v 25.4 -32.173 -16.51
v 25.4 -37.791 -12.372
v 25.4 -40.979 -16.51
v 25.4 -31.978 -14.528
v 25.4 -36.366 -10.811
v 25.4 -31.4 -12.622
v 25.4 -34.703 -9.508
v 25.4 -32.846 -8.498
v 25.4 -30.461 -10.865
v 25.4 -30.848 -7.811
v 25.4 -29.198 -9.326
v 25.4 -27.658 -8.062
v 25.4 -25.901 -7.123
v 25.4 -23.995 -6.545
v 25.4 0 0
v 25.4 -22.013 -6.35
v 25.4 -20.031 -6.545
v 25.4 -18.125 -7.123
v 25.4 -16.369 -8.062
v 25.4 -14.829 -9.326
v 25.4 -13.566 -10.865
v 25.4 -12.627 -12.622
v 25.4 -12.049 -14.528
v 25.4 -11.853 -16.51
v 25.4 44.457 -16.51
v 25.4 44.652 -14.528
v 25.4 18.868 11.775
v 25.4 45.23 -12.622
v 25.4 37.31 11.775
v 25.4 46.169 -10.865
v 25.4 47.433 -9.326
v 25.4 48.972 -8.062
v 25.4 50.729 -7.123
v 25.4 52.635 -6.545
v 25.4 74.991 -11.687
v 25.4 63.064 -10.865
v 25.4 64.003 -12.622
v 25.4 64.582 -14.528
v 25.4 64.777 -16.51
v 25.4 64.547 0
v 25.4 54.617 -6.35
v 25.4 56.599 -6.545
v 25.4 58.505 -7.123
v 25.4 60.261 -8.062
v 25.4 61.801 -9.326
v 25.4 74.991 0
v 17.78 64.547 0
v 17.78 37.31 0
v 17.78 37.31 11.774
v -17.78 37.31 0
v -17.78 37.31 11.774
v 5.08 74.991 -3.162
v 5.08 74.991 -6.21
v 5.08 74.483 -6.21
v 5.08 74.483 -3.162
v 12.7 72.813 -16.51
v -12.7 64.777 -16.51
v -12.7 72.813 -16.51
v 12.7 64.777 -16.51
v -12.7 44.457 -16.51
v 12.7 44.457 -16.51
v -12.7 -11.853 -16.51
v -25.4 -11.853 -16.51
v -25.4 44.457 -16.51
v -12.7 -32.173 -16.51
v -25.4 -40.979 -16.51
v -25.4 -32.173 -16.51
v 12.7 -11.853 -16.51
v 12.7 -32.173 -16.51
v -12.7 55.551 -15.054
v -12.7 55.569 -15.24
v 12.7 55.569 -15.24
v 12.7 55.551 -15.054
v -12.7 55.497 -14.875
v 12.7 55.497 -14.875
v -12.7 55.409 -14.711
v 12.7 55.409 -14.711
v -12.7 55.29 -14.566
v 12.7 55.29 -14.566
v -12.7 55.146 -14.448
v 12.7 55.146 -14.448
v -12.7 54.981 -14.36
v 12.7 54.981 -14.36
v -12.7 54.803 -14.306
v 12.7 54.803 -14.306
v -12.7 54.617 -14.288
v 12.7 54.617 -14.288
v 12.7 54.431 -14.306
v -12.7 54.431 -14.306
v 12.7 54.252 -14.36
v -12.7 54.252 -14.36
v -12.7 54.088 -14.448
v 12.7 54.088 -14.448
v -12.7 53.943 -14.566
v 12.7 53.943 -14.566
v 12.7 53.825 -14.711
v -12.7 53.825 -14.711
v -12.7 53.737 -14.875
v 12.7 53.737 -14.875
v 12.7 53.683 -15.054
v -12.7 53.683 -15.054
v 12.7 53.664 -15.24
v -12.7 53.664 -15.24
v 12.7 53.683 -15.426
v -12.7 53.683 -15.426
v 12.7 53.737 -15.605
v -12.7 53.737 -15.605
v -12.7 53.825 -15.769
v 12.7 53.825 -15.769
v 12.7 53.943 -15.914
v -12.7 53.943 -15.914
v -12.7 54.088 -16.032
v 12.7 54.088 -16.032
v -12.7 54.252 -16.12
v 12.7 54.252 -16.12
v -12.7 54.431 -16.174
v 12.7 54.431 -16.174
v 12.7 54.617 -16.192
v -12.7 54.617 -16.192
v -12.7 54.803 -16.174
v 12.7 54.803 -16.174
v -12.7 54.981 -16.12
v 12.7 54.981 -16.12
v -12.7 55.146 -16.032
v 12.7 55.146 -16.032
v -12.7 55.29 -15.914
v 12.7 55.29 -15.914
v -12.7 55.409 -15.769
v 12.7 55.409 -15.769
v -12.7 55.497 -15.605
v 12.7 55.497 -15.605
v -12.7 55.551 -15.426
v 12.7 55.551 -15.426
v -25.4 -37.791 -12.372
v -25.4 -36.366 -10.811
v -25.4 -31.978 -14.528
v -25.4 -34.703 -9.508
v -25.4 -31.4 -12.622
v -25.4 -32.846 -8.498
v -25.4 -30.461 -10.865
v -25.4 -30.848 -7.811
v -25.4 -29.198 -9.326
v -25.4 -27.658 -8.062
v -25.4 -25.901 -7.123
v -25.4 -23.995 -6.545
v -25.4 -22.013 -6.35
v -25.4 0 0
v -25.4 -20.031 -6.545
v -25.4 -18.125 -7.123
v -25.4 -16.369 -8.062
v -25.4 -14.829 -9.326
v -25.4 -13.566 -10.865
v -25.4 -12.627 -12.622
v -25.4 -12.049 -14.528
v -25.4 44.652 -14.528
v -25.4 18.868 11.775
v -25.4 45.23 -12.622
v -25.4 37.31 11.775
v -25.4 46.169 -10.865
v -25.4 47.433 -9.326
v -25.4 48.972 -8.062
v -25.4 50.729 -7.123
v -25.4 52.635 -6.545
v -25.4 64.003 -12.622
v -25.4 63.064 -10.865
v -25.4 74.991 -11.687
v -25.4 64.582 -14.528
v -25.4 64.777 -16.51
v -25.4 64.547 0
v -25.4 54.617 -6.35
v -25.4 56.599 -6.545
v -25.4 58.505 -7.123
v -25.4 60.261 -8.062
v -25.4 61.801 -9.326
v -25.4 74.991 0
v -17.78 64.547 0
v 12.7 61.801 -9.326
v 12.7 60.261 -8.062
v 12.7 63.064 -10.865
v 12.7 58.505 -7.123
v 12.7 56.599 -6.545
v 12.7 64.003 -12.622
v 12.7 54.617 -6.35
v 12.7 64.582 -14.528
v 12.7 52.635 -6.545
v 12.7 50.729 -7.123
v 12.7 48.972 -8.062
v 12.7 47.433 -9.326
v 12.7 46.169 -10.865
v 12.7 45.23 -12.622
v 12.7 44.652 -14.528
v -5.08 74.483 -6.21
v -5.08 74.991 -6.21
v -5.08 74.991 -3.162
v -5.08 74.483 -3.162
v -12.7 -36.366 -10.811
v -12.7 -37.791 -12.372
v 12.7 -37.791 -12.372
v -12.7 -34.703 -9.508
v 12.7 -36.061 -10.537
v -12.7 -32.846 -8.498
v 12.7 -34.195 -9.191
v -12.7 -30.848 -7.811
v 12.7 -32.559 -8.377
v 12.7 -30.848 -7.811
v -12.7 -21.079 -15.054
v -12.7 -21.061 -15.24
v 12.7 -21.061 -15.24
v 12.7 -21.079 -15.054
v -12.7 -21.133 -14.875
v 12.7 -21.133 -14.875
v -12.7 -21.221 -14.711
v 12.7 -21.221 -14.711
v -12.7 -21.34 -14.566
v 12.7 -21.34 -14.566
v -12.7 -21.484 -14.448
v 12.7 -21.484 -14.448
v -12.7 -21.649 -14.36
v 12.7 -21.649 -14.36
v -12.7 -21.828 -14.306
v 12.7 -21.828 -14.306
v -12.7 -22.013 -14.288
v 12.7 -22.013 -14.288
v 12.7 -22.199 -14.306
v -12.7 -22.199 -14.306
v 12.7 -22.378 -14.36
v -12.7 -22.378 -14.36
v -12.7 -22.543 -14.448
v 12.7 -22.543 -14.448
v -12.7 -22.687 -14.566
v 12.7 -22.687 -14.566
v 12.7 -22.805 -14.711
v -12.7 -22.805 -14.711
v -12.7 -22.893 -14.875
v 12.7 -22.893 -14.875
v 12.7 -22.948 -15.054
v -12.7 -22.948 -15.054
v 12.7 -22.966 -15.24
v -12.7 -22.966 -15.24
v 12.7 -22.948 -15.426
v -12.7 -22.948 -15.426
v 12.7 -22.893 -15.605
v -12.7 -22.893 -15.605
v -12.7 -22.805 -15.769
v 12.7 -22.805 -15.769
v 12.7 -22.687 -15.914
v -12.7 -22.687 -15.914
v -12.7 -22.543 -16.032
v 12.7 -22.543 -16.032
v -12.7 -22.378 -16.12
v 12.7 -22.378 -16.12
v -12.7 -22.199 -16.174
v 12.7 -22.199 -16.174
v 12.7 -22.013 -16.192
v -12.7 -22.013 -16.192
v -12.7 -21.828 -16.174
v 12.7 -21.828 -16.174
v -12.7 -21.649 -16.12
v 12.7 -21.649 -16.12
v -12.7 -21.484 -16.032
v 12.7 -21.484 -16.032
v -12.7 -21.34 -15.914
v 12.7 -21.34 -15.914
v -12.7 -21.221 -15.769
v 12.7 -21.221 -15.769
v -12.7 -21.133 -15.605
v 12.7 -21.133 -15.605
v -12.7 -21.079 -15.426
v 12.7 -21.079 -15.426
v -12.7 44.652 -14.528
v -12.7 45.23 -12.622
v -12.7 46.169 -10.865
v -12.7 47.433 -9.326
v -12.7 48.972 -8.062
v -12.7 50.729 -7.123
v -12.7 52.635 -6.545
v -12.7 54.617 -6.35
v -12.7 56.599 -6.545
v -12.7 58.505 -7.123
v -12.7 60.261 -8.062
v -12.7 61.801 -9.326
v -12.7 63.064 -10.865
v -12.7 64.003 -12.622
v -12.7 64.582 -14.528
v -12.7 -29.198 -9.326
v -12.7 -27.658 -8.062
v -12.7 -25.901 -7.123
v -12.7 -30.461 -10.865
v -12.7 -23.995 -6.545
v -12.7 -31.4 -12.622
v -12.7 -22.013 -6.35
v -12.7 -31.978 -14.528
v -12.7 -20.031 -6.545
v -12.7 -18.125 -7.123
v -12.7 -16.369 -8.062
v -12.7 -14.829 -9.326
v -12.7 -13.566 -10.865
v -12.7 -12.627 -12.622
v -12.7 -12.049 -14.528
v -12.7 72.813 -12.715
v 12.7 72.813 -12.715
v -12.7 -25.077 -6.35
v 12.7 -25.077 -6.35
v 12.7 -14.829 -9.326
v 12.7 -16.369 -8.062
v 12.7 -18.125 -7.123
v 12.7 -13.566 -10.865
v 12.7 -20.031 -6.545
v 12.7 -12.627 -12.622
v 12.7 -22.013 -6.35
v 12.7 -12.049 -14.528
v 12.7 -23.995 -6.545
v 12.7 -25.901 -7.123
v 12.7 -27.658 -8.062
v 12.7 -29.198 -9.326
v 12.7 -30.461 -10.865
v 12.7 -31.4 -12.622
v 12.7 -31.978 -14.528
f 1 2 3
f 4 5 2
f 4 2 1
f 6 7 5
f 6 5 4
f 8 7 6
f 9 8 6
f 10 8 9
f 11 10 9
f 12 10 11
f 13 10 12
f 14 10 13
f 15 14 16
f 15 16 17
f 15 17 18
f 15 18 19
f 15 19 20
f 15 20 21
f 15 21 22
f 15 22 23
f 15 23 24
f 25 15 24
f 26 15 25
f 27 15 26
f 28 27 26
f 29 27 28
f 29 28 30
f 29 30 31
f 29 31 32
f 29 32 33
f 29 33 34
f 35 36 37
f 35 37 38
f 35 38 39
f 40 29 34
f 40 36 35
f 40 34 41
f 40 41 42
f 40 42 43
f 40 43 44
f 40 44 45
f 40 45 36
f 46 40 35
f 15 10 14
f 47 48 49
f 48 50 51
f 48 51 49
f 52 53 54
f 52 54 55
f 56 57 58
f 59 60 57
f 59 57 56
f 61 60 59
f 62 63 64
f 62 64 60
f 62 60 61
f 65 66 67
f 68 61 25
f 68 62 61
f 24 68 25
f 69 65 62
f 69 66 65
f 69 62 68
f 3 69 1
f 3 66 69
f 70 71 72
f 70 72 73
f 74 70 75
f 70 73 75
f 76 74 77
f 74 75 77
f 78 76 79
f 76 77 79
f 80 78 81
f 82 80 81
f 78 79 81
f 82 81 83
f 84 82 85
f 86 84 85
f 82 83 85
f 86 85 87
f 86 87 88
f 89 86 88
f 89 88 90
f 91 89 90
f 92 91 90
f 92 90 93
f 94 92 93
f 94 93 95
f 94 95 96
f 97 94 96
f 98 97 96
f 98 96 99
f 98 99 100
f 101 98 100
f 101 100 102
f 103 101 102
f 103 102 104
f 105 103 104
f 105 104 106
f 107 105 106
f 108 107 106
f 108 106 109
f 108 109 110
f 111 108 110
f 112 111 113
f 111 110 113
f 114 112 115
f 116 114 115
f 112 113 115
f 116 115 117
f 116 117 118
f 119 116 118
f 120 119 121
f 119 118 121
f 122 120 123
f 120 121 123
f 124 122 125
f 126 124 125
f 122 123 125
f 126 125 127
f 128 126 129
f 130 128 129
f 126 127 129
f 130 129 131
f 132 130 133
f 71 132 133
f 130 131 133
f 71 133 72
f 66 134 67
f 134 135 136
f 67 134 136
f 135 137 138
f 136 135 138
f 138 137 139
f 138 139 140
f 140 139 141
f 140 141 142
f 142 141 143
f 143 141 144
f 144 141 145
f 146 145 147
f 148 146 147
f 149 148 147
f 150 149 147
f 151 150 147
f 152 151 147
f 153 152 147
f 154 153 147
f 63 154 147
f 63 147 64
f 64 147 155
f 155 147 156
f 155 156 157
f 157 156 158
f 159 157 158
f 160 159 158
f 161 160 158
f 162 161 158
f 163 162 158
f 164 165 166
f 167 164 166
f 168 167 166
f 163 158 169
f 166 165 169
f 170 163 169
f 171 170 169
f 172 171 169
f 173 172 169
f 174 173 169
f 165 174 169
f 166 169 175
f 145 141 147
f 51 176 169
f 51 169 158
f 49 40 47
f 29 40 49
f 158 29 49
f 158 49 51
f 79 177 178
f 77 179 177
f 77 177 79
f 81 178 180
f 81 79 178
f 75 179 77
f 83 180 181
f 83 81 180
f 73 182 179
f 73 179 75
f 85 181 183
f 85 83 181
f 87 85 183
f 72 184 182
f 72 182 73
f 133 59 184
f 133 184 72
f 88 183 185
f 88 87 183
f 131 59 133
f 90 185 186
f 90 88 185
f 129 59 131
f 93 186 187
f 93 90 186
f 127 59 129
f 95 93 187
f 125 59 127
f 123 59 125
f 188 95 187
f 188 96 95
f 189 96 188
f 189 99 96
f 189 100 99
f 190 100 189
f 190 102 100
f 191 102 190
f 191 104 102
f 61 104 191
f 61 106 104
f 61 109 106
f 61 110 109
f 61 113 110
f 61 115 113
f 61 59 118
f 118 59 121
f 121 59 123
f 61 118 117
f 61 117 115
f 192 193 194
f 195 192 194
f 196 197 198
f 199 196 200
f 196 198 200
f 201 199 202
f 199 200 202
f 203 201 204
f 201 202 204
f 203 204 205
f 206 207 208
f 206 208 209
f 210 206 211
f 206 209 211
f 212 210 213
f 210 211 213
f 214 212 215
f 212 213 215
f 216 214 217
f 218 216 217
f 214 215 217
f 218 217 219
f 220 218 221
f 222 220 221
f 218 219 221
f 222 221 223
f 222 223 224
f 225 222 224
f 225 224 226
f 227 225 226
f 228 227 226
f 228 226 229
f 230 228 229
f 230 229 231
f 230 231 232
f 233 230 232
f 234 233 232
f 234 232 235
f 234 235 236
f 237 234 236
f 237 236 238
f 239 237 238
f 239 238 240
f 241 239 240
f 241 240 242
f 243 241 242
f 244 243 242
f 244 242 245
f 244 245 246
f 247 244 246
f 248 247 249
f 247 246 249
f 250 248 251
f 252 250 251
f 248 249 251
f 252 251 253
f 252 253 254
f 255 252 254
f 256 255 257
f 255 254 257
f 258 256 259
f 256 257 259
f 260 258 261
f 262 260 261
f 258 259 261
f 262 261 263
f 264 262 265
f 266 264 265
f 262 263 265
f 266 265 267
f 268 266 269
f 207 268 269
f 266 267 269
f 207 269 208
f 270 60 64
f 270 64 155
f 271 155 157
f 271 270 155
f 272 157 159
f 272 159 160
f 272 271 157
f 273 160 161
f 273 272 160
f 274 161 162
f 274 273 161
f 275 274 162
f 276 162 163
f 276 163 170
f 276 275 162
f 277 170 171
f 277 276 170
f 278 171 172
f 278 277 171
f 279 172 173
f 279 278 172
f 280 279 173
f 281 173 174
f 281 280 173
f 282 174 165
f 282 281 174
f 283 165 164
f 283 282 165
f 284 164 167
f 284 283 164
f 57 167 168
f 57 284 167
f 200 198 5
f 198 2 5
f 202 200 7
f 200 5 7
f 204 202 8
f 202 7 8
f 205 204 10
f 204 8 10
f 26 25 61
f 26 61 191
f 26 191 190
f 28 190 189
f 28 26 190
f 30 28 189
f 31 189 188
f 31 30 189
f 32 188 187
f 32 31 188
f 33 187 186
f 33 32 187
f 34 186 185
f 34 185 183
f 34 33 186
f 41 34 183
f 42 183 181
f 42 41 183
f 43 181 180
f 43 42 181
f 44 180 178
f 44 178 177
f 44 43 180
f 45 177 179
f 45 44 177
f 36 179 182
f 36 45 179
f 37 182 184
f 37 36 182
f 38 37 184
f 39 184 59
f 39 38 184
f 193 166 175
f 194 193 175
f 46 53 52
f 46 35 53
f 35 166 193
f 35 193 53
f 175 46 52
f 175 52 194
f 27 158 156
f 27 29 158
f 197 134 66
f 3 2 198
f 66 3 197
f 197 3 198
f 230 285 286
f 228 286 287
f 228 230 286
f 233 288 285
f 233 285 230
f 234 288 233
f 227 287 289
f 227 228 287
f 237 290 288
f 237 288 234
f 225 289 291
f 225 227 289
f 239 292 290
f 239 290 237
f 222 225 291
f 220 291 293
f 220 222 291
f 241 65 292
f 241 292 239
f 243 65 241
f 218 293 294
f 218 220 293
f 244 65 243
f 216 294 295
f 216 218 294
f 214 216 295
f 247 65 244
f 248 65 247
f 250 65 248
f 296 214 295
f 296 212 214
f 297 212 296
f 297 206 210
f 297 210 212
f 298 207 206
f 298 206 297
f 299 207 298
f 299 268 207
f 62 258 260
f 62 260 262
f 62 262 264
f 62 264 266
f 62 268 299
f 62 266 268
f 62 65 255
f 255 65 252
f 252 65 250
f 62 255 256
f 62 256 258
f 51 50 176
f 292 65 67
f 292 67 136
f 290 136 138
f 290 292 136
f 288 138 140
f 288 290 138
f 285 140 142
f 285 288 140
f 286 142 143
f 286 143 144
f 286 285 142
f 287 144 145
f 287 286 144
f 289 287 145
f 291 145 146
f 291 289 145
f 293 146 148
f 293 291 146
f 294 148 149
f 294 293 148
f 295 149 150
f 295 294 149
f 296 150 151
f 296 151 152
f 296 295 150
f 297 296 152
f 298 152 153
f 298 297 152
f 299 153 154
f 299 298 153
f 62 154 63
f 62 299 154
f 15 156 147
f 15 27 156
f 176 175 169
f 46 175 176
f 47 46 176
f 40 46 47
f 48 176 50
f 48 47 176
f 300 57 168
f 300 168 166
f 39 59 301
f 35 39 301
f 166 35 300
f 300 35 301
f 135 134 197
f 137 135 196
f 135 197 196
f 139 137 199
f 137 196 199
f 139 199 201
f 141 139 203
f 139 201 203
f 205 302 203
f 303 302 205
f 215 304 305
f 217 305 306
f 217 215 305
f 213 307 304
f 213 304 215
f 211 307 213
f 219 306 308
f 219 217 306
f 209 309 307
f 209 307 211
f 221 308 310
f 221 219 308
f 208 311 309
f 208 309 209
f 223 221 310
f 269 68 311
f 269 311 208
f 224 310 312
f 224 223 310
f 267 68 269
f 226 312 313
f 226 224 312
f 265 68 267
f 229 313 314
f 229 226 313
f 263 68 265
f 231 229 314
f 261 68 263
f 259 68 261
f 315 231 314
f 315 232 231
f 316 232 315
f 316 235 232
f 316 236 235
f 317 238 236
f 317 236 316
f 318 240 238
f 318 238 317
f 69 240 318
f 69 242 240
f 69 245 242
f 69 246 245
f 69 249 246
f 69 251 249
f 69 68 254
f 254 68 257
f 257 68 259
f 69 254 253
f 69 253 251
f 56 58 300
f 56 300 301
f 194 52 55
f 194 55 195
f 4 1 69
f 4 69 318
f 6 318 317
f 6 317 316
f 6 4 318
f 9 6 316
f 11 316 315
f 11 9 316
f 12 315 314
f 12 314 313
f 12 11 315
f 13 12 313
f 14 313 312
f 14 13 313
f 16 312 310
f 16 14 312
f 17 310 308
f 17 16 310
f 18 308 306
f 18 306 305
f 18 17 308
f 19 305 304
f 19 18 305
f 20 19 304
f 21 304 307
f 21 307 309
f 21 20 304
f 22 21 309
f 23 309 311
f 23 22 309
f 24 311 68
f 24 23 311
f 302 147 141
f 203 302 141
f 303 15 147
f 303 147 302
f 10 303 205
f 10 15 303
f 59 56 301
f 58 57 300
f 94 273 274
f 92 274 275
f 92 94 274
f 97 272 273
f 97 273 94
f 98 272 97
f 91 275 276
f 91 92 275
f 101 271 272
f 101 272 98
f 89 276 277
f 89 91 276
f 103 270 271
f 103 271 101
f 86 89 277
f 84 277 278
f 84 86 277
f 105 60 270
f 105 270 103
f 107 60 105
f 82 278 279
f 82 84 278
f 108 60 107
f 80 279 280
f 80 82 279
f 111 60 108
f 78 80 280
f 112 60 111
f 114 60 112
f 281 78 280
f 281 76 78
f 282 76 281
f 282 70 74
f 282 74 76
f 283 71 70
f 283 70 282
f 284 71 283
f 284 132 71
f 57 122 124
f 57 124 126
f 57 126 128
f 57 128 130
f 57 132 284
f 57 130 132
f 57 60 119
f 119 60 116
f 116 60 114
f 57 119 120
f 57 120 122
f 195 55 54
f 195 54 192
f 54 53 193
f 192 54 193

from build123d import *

# Parameters (mm, degrees)
F1_DEPTH  = 25.4
F2_W      = 35.56
F2_H      = 27.2373445332
F3_DEPTH  = 11.7755213211
F5_DEPTH  = 10.16
F6_W      = 50.8
F6_H      = 36.2164959553
F7_DEPTH  = 21.4742356462
F8_R      = 12.7
F9_W      = 10.16
F9_H      = 3.048
F10_DEPTH = 0.508
F11_R     = 0.9525
F12_DEPTH = 38.101
F13_R     = 0.9525
F14_DEPTH = 38.101


with BuildPart() as f1:
    # F0 (on Right) → F1 (new body, symmetric)
    with BuildSketch(Plane.YZ):
        with BuildLine():
            Line((18.8676062971, 11.7745213211), (0, 0))
            Line((0, 0), (-35.1084388614, -8.89))
            Line((-35.1084388614, -8.89), (-40.9786602931, -16.51))
            Line((-40.9786602931, -16.51), (-32.1733296278, -16.51))
            ThreePointArc((-32.1733296278, -16.51), (-22.0133296278, -6.35), (-11.8533296278, -16.51))
            Line((-11.8533296278, -16.51), (44.4567567372, -16.51))
            ThreePointArc((44.4567567372, -16.51), (54.6167567372, -6.35), (64.7767567372, -16.51))
            Line((64.7767567372, -16.51), (74.9908098316, -11.6867008752))
            Line((74.9908098316, -11.6867008752), (74.9908098316, 0))
            Line((74.9908098316, 0), (64.5470768213, 0))
            Line((64.5470768213, 0), (37.3096317053, 11.7745213211))
            Line((37.3096317053, 11.7745213211), (18.8676062971, 11.7745213211))
        make_face()
    extrude(amount=F1_DEPTH, both=True)

    # F2 (on face) → F3 (cut, through all)
    with BuildSketch(Plane.XY):
        with Locations((0, 50.9284045547)):
            Rectangle(F2_W, F2_H)
    extrude(amount=F3_DEPTH, mode=Mode.SUBTRACT)

    # F4 (on face) → F5 (join)
    with BuildSketch(Plane(origin=(0, 0, -16.51), x_dir=(1, 0, 0), z_dir=(0, 0, -1))):
        Polygon((-12.7, -72.8133333333), (0, -72.8133333333), (12.7, -72.8133333333), (12.7, 32.1743115783), (-12.7, 32.1743115783), align=None)
    extrude(amount=-F5_DEPTH)

    # F6 (on face) → F7 (cut, through all)
    with BuildSketch(Plane(origin=(0, 0, 0), x_dir=(1, 0, 0), z_dir=(0, -0.2454682532, 0.96940463))):
        with Locations((0, -18.1082479777)):
            Rectangle(F6_W, F6_H)
    extrude(amount=F7_DEPTH, mode=Mode.SUBTRACT)

    # F8
    f8_edges = [f1.edges().sort_by_distance(p)[0] for p in [
        (0, -35.108439, -8.89),
    ]]
    fillet(f8_edges, radius=F8_R)

    # F9 (on face) → F10 (cut)
    with BuildSketch(Plane(origin=(0, 74.9908098316, 0), x_dir=(-1, 0, 0), z_dir=(0, 1, 0))):
        with Locations((0, -4.6856853668)):
            Rectangle(F9_W, F9_H)
    extrude(amount=-F10_DEPTH, mode=Mode.SUBTRACT)

    # F11 (on face) → F12 (cut, through all)
    with BuildSketch(Plane.YZ.offset(12.7)):
        with Locations((-22.0133296278, -15.24)):
            Circle(F11_R)
    extrude(amount=-F12_DEPTH, mode=Mode.SUBTRACT)

    # F13 (on face) → F14 (cut, through all)
    with BuildSketch(Plane.YZ.offset(12.7)):
        with Locations((54.6167567372, -15.24)):
            Circle(F13_R)
    extrude(amount=-F14_DEPTH, mode=Mode.SUBTRACT)


solid = f1.part
